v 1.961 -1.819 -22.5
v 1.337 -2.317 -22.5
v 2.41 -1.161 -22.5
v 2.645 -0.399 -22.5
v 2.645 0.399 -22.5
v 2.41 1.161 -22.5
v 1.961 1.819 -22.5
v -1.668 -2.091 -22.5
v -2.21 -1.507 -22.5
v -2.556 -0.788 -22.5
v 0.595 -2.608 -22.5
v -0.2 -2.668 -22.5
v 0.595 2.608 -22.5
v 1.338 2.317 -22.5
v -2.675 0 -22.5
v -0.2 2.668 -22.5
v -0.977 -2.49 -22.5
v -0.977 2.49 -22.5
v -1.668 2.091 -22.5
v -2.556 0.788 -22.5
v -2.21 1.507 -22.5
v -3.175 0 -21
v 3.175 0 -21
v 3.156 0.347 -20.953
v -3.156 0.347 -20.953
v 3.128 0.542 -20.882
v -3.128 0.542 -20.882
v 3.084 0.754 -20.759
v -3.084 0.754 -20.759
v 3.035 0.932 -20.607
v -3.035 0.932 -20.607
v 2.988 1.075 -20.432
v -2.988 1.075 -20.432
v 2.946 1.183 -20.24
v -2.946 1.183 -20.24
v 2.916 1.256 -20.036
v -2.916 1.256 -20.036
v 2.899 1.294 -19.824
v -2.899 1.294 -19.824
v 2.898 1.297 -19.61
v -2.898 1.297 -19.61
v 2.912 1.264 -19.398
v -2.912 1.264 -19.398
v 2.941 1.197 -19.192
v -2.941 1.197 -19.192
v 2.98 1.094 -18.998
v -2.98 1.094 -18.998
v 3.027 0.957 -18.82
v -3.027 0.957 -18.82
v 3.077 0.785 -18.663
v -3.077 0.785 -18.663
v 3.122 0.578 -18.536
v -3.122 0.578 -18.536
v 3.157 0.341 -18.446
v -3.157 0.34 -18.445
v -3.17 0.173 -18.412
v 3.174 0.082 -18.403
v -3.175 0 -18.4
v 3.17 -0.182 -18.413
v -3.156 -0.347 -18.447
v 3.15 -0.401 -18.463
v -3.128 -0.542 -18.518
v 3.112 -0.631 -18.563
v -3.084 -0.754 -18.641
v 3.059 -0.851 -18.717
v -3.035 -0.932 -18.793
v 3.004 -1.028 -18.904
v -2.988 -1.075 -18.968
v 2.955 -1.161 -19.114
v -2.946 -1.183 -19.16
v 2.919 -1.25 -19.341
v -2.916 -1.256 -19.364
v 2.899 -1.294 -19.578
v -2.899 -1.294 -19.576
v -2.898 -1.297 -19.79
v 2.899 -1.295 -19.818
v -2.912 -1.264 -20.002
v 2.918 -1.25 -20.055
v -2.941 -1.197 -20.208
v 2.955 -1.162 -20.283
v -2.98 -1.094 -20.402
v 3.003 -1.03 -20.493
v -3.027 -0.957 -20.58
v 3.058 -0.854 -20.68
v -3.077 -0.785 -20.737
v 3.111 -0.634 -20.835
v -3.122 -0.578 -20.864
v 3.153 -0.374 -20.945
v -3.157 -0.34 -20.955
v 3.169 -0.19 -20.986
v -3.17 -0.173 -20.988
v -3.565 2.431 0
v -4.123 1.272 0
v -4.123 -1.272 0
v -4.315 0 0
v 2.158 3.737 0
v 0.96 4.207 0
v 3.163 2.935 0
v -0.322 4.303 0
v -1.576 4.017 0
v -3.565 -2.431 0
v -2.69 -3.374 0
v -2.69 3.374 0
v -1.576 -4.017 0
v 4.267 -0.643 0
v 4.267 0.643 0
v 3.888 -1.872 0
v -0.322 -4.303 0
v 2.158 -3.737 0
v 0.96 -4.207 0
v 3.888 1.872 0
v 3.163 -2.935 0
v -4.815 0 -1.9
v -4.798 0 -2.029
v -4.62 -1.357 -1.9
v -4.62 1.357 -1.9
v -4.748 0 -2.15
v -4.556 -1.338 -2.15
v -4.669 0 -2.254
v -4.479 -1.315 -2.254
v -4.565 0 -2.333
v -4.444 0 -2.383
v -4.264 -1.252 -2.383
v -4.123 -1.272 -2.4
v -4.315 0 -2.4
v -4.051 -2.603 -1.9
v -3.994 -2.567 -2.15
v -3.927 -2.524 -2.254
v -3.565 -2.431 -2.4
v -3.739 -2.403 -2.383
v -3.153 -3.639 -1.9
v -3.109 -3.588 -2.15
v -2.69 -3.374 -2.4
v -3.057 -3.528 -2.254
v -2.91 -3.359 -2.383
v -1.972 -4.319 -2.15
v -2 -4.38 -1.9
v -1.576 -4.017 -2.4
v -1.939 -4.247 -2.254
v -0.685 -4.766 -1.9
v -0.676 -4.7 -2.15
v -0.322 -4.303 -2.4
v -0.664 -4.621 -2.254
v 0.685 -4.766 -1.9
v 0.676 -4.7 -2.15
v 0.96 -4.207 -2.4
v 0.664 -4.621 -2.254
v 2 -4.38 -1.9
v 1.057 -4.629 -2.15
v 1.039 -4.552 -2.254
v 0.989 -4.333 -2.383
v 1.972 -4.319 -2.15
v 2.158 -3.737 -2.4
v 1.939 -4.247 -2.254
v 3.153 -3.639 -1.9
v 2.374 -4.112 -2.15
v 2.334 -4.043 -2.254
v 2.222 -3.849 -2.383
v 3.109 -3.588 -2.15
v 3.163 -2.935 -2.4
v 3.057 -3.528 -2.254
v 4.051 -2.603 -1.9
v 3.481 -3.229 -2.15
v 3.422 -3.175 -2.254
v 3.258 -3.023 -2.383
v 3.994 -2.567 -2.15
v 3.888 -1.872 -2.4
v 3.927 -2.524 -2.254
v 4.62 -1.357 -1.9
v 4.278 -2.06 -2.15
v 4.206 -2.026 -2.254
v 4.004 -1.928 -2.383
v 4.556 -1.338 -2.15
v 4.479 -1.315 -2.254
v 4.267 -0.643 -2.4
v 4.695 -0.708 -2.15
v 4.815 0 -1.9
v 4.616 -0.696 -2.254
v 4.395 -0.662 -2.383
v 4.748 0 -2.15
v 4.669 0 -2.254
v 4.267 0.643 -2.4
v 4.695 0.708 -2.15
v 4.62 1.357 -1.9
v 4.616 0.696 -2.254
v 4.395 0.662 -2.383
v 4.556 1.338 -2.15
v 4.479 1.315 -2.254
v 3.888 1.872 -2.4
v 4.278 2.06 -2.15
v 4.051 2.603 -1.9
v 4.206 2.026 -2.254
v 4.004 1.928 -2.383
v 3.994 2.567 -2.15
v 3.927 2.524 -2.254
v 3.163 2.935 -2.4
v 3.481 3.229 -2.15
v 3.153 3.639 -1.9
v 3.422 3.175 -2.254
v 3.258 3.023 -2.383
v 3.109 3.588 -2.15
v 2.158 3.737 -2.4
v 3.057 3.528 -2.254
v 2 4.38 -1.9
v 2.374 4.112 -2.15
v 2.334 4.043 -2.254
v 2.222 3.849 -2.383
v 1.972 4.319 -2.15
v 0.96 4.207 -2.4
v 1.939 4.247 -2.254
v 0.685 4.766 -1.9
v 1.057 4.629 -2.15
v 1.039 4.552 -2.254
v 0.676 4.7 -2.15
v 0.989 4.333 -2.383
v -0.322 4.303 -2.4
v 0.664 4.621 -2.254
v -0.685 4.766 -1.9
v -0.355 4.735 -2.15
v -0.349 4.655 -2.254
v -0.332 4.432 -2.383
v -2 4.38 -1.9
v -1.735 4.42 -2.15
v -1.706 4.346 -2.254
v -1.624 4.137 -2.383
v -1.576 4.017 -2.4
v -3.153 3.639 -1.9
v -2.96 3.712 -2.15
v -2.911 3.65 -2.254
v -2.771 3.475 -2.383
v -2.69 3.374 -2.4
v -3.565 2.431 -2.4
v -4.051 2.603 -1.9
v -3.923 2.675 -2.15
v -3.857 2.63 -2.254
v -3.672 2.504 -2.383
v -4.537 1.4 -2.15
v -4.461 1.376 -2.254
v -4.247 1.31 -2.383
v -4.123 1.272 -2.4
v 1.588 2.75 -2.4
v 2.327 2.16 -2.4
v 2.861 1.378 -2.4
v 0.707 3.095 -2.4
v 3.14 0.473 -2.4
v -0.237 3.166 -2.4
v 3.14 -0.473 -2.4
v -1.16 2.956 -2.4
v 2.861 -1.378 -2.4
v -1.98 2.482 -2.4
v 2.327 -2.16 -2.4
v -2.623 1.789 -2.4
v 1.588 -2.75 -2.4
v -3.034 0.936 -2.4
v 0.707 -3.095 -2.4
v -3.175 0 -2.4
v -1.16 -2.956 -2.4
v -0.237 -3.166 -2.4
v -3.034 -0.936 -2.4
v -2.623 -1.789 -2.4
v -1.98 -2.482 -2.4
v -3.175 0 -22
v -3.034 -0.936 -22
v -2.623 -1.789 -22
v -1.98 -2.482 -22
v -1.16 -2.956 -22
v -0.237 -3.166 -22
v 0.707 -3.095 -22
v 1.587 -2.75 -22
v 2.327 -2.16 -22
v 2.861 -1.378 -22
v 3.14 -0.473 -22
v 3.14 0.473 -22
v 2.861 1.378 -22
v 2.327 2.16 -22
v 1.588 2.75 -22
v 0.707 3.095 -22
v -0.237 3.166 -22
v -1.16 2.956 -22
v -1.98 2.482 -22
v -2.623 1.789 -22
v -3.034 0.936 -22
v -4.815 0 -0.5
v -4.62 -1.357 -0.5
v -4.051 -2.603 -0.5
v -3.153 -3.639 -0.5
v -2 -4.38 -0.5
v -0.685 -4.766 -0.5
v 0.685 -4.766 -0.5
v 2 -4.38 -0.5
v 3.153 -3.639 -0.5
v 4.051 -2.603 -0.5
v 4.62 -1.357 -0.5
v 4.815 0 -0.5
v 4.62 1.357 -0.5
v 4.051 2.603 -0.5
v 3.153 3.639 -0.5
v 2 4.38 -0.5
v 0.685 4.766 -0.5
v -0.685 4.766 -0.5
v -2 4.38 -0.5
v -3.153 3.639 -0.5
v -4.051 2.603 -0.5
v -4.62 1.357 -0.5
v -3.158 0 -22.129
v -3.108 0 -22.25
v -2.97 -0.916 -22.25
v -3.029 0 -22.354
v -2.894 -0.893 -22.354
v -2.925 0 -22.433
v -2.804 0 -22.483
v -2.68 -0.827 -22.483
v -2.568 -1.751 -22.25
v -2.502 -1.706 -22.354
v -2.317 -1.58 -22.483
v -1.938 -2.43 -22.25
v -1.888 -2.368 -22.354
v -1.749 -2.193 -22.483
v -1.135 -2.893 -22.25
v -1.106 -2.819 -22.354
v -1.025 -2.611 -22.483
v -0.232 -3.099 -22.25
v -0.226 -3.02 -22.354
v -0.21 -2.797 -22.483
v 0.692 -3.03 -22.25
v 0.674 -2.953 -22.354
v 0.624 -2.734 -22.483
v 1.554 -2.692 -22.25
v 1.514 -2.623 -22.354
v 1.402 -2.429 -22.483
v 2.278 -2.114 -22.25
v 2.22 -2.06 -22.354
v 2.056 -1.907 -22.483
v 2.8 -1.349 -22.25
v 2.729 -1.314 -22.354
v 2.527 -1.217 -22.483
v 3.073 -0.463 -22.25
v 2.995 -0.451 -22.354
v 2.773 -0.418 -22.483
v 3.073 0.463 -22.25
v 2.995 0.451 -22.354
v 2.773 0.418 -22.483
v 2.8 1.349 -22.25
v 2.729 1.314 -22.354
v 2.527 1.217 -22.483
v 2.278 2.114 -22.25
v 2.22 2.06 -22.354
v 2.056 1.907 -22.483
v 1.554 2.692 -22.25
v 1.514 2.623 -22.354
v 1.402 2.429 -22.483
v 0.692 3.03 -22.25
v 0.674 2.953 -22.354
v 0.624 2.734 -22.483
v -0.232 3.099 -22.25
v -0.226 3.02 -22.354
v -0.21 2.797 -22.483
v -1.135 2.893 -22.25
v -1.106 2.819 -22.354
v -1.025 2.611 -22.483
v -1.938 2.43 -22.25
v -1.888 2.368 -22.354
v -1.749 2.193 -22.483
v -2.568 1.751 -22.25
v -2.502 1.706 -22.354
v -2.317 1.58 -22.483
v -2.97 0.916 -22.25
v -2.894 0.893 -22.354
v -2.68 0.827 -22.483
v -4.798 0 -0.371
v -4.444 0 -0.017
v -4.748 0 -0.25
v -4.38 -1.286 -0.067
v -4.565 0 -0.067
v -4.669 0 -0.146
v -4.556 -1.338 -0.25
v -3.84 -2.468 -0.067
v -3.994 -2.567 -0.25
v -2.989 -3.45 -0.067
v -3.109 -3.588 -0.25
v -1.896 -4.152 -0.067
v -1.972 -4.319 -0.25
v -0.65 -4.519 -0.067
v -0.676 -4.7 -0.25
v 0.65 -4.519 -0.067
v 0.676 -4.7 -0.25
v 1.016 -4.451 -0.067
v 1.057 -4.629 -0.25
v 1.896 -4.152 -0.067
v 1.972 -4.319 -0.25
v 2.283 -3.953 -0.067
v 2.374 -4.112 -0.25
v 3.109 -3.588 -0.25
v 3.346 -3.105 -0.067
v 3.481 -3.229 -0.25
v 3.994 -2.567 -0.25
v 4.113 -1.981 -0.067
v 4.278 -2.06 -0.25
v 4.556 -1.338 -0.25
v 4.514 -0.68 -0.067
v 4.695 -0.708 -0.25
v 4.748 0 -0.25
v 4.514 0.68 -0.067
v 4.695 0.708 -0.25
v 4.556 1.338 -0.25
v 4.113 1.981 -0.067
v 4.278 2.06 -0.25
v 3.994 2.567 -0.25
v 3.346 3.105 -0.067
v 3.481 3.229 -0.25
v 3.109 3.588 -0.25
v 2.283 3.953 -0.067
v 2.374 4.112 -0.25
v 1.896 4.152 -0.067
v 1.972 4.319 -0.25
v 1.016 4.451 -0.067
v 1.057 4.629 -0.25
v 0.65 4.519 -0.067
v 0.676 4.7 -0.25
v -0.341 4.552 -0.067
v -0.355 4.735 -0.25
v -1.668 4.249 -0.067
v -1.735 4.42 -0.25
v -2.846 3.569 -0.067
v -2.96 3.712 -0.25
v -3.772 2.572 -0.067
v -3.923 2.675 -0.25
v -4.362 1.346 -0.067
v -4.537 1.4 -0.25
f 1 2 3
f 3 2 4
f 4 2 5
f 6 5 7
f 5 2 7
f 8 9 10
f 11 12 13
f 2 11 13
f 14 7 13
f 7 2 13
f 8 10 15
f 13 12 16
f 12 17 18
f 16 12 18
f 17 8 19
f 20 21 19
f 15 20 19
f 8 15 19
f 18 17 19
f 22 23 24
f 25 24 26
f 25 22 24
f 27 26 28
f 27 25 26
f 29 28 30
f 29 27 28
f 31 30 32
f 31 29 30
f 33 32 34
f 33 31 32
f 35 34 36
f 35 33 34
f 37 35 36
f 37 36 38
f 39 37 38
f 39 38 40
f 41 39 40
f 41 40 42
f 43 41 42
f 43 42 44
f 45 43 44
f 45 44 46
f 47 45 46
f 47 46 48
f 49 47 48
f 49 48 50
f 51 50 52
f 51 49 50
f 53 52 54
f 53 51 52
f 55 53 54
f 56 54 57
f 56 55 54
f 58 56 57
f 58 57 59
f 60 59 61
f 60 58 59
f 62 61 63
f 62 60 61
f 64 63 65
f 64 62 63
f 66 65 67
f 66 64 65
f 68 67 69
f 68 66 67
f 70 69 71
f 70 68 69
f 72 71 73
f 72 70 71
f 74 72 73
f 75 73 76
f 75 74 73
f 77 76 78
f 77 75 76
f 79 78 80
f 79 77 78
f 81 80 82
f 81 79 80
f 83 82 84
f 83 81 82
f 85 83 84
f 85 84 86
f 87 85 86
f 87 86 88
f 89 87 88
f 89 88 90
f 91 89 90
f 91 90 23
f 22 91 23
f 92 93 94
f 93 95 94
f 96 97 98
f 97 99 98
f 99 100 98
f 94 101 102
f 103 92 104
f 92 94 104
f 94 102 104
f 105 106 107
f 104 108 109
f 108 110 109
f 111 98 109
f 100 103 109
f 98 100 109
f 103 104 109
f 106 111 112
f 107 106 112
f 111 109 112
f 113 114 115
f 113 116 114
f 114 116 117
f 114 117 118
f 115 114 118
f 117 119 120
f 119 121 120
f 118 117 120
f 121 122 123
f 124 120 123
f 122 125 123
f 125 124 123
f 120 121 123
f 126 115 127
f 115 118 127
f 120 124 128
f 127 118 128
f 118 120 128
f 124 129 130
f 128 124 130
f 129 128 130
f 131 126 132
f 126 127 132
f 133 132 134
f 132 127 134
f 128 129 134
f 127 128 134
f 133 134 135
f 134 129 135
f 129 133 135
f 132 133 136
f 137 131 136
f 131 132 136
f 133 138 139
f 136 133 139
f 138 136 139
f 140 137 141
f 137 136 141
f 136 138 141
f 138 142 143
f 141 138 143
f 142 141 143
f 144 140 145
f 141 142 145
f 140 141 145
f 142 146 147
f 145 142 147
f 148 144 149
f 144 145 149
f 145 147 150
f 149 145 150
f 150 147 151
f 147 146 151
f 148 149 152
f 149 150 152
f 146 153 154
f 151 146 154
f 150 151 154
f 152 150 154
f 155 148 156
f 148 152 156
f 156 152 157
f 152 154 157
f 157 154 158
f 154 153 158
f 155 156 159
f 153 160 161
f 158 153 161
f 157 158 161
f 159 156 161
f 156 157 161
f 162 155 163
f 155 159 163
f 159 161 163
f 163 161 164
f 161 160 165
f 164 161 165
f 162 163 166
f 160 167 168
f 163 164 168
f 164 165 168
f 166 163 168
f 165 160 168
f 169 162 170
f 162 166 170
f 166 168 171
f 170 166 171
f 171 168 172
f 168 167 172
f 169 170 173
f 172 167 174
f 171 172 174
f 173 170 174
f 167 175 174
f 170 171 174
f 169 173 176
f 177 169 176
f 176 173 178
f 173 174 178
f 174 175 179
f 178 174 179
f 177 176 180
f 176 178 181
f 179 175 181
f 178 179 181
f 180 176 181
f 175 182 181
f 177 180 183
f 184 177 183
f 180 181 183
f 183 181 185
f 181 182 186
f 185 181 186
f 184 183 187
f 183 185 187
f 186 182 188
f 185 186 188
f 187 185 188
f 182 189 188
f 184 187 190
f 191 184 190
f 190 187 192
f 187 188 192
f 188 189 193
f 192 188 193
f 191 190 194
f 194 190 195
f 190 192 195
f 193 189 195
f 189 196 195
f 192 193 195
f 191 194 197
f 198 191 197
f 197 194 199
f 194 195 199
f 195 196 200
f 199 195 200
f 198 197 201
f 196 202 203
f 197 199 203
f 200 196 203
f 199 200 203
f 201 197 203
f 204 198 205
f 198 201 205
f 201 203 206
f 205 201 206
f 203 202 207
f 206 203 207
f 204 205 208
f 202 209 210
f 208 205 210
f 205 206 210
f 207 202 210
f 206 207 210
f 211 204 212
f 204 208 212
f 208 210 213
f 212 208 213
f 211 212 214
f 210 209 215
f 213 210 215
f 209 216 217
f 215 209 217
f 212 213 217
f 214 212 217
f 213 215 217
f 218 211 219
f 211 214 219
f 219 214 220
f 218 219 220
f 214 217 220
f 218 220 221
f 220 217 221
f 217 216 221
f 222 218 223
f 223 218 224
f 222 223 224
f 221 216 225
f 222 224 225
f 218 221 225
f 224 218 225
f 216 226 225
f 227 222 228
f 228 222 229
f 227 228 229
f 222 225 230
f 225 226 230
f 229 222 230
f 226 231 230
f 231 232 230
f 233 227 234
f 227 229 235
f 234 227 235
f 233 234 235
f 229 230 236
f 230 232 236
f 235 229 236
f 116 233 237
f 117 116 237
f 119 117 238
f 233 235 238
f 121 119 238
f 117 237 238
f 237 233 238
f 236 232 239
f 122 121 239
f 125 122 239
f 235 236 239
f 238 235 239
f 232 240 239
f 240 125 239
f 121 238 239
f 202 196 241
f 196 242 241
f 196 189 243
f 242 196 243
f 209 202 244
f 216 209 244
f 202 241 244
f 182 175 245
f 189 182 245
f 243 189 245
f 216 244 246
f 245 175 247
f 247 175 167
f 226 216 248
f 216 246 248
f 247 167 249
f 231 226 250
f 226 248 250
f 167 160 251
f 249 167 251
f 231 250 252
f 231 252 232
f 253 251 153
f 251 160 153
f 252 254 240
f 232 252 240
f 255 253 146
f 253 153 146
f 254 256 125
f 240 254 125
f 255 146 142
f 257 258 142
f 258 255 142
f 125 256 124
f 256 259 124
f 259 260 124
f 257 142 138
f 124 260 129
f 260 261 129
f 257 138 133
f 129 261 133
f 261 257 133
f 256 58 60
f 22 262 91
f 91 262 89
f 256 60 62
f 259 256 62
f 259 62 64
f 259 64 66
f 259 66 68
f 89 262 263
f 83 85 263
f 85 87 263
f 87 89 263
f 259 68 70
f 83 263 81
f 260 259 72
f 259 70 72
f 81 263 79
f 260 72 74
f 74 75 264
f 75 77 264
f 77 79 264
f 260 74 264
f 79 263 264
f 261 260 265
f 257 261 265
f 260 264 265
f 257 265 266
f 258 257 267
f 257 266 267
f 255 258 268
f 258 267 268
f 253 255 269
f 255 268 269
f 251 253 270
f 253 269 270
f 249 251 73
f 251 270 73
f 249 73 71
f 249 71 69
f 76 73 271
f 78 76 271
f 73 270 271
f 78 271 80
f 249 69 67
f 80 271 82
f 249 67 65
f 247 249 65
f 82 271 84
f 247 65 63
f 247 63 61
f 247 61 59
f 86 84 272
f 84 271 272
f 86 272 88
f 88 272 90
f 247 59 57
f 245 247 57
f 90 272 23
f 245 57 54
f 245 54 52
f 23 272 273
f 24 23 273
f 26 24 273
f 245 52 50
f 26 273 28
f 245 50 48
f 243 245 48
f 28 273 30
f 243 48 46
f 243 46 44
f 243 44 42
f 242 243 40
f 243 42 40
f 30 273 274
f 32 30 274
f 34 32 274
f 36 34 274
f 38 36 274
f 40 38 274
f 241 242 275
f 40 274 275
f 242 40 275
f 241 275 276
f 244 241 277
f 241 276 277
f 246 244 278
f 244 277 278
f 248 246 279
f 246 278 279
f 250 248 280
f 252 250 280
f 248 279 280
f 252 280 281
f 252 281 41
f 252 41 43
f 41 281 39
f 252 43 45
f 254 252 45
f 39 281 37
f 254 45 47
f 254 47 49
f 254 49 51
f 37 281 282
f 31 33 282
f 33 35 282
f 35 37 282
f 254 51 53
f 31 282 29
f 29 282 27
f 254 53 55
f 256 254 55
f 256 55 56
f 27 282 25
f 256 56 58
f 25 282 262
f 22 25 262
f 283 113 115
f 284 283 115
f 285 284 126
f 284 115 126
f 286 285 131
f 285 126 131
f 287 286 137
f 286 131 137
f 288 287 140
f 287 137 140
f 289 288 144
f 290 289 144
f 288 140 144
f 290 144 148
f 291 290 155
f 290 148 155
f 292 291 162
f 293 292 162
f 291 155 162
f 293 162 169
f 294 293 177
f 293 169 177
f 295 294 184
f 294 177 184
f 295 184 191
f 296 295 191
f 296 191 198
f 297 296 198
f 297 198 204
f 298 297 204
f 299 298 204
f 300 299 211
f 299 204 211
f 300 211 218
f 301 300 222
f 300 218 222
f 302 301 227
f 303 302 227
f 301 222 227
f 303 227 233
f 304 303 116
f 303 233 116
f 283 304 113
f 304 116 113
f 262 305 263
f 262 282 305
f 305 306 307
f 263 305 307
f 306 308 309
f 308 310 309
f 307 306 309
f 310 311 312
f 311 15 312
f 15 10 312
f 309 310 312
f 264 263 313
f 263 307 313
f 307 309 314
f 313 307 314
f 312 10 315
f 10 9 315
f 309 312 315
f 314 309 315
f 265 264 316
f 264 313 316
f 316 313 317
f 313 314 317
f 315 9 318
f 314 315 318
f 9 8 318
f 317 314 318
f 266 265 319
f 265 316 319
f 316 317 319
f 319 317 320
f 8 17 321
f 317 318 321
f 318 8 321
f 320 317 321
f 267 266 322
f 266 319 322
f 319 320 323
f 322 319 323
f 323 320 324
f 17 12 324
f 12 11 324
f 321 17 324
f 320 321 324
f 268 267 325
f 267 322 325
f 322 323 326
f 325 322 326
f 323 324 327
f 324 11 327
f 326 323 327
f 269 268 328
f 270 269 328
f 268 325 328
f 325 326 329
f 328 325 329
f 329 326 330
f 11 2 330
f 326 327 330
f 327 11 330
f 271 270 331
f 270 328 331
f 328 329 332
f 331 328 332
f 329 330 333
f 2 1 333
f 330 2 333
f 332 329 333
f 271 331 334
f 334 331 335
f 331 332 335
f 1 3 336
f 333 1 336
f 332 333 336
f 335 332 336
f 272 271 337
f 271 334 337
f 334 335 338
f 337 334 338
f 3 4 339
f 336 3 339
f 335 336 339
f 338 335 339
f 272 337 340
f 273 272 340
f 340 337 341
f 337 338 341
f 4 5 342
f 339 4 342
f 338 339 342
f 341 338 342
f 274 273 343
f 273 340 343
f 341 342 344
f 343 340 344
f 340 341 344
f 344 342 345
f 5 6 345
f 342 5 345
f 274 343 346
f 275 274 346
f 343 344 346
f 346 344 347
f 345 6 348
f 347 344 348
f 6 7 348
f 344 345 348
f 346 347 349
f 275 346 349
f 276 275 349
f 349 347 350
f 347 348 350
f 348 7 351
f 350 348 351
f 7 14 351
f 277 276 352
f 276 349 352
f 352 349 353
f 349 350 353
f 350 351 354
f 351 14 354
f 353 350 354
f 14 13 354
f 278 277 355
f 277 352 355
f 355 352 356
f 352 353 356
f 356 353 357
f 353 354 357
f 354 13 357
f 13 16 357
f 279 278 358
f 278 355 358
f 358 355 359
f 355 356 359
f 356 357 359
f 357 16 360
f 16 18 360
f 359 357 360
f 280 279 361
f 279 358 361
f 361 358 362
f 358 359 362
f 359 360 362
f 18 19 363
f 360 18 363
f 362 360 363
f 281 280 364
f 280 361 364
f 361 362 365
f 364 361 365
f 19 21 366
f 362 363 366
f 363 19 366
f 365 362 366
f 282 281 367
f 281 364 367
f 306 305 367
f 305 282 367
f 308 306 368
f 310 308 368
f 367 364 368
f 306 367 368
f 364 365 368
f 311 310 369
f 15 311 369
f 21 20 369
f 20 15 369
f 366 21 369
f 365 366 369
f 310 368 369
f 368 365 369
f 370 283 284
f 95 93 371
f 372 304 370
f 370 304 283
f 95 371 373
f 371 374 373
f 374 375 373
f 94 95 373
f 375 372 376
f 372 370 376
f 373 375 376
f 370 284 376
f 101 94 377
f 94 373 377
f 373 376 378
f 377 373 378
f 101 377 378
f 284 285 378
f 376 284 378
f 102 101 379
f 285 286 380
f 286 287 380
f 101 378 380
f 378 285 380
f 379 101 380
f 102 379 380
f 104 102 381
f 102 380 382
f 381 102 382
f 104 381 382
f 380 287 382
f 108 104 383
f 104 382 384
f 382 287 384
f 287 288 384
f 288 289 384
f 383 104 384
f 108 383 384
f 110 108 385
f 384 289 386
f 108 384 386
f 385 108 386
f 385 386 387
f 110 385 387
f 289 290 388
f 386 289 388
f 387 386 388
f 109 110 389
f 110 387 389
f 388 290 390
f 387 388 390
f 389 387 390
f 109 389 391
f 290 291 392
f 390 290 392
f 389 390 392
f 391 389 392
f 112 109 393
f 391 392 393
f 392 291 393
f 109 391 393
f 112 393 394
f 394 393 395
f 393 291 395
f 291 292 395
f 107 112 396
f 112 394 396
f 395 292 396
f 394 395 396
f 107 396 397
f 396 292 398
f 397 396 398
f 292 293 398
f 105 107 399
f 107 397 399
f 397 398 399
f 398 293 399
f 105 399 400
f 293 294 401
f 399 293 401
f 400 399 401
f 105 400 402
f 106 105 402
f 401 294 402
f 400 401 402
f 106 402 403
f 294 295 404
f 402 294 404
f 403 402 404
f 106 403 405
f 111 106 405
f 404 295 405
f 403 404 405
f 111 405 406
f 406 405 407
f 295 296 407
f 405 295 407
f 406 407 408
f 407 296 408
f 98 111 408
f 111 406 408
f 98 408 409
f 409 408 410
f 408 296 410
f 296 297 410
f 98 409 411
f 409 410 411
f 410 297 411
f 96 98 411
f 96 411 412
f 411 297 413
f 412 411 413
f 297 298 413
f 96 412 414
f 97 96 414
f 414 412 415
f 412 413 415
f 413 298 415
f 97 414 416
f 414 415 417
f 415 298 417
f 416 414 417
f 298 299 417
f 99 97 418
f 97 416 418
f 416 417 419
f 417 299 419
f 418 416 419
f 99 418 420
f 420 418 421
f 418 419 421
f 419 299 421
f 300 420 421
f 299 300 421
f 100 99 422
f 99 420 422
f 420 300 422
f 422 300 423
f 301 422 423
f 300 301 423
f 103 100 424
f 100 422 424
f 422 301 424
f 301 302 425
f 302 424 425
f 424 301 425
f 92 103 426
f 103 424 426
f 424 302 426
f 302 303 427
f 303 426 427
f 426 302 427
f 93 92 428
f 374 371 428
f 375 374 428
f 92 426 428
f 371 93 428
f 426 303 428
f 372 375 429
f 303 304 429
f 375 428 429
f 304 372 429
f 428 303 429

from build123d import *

# Parameters (mm, degrees)
CUT_EXTRUDE1_DEPTH      = 54.63402325
CUT_EXTRUDE1_DEPTH_BACK = 54.63402325
SKETCH2_R               = 1.3
F7F_R                   = 0.5
CUT_EXTRUDE2_DEPTH      = 54.634023349
CUT_EXTRUDE2_DEPTH_BACK = 54.634023349
SKETCH3_W               = 6.35
SKETCH3_H               = 30.7
FILLET1_R               = 0.5


with BuildPart() as part:
    # Sketch1 → Revolve1 (revolve)
    with BuildSketch(Plane.YZ, mode=Mode.PRIVATE) as revolve1_sk:
        Polygon((0, 0), (4.815, 0), (4.815, -2.4), (3.175, -2.4), (3.175, -53.2), (0, -53.2), align=None)
    revolve(revolve1_sk.sketch.rotate(Axis((0, 0, -335.576810525), (0, 0, 1)), 90), axis=Axis((0, 0, -335.576810525), (0, 0, 1)))

    # Sketch2 → Cut-Extrude1 (cut, two sides: drawn at the far end of the back side and taken through both)
    with BuildSketch(Plane.YZ.offset(-CUT_EXTRUDE1_DEPTH_BACK)):
        with Locations(Location((0, -47.7, 0), (0, 0, 270.000000002))):
            Circle(SKETCH2_R)
        with Locations(Location((0, -42.1, 0), (0, 0, 270.000000002))):
            Circle(SKETCH2_R)
        with Locations(Location((0, -25.3, 0), (0, 0, 270.000000002))):
            Circle(SKETCH2_R)
        with Locations(Location((0, -30.9, 0), (0, 0, 270.000000002))):
            Circle(SKETCH2_R)
        with Locations(Location((0, -36.5, 0), (0, 0, 270.000000002))):
            Circle(SKETCH2_R)
        with Locations(Location((0, -19.7, 0), (0, 0, 270.000000002))):
            Circle(SKETCH2_R)
    extrude(amount=CUT_EXTRUDE1_DEPTH + CUT_EXTRUDE1_DEPTH_BACK, mode=Mode.SUBTRACT)

    # f7f
    f7f_edges = [part.edges().sort_by_distance(p)[0] for p in [
        (4.815, 0, -2.4),
        (4.815, 0, 0),
    ]]
    fillet(f7f_edges, radius=F7F_R)

    # Sketch3 → Cut-Extrude2 (cut, two sides: drawn at the far end of the back side and taken through both)
    with BuildSketch(Plane.YZ.offset(-CUT_EXTRUDE2_DEPTH_BACK)):
        with Locations((0, -37.85)):
            Rectangle(SKETCH3_W, SKETCH3_H)
    extrude(amount=CUT_EXTRUDE2_DEPTH + CUT_EXTRUDE2_DEPTH_BACK, mode=Mode.SUBTRACT)

    # Fillet1
    fillet1_edges = [part.edges().sort_by_distance(p)[0] for p in [
        (3.175, 0, -22.5),
    ]]
    fillet(fillet1_edges, radius=FILLET1_R)


solid = part.part
